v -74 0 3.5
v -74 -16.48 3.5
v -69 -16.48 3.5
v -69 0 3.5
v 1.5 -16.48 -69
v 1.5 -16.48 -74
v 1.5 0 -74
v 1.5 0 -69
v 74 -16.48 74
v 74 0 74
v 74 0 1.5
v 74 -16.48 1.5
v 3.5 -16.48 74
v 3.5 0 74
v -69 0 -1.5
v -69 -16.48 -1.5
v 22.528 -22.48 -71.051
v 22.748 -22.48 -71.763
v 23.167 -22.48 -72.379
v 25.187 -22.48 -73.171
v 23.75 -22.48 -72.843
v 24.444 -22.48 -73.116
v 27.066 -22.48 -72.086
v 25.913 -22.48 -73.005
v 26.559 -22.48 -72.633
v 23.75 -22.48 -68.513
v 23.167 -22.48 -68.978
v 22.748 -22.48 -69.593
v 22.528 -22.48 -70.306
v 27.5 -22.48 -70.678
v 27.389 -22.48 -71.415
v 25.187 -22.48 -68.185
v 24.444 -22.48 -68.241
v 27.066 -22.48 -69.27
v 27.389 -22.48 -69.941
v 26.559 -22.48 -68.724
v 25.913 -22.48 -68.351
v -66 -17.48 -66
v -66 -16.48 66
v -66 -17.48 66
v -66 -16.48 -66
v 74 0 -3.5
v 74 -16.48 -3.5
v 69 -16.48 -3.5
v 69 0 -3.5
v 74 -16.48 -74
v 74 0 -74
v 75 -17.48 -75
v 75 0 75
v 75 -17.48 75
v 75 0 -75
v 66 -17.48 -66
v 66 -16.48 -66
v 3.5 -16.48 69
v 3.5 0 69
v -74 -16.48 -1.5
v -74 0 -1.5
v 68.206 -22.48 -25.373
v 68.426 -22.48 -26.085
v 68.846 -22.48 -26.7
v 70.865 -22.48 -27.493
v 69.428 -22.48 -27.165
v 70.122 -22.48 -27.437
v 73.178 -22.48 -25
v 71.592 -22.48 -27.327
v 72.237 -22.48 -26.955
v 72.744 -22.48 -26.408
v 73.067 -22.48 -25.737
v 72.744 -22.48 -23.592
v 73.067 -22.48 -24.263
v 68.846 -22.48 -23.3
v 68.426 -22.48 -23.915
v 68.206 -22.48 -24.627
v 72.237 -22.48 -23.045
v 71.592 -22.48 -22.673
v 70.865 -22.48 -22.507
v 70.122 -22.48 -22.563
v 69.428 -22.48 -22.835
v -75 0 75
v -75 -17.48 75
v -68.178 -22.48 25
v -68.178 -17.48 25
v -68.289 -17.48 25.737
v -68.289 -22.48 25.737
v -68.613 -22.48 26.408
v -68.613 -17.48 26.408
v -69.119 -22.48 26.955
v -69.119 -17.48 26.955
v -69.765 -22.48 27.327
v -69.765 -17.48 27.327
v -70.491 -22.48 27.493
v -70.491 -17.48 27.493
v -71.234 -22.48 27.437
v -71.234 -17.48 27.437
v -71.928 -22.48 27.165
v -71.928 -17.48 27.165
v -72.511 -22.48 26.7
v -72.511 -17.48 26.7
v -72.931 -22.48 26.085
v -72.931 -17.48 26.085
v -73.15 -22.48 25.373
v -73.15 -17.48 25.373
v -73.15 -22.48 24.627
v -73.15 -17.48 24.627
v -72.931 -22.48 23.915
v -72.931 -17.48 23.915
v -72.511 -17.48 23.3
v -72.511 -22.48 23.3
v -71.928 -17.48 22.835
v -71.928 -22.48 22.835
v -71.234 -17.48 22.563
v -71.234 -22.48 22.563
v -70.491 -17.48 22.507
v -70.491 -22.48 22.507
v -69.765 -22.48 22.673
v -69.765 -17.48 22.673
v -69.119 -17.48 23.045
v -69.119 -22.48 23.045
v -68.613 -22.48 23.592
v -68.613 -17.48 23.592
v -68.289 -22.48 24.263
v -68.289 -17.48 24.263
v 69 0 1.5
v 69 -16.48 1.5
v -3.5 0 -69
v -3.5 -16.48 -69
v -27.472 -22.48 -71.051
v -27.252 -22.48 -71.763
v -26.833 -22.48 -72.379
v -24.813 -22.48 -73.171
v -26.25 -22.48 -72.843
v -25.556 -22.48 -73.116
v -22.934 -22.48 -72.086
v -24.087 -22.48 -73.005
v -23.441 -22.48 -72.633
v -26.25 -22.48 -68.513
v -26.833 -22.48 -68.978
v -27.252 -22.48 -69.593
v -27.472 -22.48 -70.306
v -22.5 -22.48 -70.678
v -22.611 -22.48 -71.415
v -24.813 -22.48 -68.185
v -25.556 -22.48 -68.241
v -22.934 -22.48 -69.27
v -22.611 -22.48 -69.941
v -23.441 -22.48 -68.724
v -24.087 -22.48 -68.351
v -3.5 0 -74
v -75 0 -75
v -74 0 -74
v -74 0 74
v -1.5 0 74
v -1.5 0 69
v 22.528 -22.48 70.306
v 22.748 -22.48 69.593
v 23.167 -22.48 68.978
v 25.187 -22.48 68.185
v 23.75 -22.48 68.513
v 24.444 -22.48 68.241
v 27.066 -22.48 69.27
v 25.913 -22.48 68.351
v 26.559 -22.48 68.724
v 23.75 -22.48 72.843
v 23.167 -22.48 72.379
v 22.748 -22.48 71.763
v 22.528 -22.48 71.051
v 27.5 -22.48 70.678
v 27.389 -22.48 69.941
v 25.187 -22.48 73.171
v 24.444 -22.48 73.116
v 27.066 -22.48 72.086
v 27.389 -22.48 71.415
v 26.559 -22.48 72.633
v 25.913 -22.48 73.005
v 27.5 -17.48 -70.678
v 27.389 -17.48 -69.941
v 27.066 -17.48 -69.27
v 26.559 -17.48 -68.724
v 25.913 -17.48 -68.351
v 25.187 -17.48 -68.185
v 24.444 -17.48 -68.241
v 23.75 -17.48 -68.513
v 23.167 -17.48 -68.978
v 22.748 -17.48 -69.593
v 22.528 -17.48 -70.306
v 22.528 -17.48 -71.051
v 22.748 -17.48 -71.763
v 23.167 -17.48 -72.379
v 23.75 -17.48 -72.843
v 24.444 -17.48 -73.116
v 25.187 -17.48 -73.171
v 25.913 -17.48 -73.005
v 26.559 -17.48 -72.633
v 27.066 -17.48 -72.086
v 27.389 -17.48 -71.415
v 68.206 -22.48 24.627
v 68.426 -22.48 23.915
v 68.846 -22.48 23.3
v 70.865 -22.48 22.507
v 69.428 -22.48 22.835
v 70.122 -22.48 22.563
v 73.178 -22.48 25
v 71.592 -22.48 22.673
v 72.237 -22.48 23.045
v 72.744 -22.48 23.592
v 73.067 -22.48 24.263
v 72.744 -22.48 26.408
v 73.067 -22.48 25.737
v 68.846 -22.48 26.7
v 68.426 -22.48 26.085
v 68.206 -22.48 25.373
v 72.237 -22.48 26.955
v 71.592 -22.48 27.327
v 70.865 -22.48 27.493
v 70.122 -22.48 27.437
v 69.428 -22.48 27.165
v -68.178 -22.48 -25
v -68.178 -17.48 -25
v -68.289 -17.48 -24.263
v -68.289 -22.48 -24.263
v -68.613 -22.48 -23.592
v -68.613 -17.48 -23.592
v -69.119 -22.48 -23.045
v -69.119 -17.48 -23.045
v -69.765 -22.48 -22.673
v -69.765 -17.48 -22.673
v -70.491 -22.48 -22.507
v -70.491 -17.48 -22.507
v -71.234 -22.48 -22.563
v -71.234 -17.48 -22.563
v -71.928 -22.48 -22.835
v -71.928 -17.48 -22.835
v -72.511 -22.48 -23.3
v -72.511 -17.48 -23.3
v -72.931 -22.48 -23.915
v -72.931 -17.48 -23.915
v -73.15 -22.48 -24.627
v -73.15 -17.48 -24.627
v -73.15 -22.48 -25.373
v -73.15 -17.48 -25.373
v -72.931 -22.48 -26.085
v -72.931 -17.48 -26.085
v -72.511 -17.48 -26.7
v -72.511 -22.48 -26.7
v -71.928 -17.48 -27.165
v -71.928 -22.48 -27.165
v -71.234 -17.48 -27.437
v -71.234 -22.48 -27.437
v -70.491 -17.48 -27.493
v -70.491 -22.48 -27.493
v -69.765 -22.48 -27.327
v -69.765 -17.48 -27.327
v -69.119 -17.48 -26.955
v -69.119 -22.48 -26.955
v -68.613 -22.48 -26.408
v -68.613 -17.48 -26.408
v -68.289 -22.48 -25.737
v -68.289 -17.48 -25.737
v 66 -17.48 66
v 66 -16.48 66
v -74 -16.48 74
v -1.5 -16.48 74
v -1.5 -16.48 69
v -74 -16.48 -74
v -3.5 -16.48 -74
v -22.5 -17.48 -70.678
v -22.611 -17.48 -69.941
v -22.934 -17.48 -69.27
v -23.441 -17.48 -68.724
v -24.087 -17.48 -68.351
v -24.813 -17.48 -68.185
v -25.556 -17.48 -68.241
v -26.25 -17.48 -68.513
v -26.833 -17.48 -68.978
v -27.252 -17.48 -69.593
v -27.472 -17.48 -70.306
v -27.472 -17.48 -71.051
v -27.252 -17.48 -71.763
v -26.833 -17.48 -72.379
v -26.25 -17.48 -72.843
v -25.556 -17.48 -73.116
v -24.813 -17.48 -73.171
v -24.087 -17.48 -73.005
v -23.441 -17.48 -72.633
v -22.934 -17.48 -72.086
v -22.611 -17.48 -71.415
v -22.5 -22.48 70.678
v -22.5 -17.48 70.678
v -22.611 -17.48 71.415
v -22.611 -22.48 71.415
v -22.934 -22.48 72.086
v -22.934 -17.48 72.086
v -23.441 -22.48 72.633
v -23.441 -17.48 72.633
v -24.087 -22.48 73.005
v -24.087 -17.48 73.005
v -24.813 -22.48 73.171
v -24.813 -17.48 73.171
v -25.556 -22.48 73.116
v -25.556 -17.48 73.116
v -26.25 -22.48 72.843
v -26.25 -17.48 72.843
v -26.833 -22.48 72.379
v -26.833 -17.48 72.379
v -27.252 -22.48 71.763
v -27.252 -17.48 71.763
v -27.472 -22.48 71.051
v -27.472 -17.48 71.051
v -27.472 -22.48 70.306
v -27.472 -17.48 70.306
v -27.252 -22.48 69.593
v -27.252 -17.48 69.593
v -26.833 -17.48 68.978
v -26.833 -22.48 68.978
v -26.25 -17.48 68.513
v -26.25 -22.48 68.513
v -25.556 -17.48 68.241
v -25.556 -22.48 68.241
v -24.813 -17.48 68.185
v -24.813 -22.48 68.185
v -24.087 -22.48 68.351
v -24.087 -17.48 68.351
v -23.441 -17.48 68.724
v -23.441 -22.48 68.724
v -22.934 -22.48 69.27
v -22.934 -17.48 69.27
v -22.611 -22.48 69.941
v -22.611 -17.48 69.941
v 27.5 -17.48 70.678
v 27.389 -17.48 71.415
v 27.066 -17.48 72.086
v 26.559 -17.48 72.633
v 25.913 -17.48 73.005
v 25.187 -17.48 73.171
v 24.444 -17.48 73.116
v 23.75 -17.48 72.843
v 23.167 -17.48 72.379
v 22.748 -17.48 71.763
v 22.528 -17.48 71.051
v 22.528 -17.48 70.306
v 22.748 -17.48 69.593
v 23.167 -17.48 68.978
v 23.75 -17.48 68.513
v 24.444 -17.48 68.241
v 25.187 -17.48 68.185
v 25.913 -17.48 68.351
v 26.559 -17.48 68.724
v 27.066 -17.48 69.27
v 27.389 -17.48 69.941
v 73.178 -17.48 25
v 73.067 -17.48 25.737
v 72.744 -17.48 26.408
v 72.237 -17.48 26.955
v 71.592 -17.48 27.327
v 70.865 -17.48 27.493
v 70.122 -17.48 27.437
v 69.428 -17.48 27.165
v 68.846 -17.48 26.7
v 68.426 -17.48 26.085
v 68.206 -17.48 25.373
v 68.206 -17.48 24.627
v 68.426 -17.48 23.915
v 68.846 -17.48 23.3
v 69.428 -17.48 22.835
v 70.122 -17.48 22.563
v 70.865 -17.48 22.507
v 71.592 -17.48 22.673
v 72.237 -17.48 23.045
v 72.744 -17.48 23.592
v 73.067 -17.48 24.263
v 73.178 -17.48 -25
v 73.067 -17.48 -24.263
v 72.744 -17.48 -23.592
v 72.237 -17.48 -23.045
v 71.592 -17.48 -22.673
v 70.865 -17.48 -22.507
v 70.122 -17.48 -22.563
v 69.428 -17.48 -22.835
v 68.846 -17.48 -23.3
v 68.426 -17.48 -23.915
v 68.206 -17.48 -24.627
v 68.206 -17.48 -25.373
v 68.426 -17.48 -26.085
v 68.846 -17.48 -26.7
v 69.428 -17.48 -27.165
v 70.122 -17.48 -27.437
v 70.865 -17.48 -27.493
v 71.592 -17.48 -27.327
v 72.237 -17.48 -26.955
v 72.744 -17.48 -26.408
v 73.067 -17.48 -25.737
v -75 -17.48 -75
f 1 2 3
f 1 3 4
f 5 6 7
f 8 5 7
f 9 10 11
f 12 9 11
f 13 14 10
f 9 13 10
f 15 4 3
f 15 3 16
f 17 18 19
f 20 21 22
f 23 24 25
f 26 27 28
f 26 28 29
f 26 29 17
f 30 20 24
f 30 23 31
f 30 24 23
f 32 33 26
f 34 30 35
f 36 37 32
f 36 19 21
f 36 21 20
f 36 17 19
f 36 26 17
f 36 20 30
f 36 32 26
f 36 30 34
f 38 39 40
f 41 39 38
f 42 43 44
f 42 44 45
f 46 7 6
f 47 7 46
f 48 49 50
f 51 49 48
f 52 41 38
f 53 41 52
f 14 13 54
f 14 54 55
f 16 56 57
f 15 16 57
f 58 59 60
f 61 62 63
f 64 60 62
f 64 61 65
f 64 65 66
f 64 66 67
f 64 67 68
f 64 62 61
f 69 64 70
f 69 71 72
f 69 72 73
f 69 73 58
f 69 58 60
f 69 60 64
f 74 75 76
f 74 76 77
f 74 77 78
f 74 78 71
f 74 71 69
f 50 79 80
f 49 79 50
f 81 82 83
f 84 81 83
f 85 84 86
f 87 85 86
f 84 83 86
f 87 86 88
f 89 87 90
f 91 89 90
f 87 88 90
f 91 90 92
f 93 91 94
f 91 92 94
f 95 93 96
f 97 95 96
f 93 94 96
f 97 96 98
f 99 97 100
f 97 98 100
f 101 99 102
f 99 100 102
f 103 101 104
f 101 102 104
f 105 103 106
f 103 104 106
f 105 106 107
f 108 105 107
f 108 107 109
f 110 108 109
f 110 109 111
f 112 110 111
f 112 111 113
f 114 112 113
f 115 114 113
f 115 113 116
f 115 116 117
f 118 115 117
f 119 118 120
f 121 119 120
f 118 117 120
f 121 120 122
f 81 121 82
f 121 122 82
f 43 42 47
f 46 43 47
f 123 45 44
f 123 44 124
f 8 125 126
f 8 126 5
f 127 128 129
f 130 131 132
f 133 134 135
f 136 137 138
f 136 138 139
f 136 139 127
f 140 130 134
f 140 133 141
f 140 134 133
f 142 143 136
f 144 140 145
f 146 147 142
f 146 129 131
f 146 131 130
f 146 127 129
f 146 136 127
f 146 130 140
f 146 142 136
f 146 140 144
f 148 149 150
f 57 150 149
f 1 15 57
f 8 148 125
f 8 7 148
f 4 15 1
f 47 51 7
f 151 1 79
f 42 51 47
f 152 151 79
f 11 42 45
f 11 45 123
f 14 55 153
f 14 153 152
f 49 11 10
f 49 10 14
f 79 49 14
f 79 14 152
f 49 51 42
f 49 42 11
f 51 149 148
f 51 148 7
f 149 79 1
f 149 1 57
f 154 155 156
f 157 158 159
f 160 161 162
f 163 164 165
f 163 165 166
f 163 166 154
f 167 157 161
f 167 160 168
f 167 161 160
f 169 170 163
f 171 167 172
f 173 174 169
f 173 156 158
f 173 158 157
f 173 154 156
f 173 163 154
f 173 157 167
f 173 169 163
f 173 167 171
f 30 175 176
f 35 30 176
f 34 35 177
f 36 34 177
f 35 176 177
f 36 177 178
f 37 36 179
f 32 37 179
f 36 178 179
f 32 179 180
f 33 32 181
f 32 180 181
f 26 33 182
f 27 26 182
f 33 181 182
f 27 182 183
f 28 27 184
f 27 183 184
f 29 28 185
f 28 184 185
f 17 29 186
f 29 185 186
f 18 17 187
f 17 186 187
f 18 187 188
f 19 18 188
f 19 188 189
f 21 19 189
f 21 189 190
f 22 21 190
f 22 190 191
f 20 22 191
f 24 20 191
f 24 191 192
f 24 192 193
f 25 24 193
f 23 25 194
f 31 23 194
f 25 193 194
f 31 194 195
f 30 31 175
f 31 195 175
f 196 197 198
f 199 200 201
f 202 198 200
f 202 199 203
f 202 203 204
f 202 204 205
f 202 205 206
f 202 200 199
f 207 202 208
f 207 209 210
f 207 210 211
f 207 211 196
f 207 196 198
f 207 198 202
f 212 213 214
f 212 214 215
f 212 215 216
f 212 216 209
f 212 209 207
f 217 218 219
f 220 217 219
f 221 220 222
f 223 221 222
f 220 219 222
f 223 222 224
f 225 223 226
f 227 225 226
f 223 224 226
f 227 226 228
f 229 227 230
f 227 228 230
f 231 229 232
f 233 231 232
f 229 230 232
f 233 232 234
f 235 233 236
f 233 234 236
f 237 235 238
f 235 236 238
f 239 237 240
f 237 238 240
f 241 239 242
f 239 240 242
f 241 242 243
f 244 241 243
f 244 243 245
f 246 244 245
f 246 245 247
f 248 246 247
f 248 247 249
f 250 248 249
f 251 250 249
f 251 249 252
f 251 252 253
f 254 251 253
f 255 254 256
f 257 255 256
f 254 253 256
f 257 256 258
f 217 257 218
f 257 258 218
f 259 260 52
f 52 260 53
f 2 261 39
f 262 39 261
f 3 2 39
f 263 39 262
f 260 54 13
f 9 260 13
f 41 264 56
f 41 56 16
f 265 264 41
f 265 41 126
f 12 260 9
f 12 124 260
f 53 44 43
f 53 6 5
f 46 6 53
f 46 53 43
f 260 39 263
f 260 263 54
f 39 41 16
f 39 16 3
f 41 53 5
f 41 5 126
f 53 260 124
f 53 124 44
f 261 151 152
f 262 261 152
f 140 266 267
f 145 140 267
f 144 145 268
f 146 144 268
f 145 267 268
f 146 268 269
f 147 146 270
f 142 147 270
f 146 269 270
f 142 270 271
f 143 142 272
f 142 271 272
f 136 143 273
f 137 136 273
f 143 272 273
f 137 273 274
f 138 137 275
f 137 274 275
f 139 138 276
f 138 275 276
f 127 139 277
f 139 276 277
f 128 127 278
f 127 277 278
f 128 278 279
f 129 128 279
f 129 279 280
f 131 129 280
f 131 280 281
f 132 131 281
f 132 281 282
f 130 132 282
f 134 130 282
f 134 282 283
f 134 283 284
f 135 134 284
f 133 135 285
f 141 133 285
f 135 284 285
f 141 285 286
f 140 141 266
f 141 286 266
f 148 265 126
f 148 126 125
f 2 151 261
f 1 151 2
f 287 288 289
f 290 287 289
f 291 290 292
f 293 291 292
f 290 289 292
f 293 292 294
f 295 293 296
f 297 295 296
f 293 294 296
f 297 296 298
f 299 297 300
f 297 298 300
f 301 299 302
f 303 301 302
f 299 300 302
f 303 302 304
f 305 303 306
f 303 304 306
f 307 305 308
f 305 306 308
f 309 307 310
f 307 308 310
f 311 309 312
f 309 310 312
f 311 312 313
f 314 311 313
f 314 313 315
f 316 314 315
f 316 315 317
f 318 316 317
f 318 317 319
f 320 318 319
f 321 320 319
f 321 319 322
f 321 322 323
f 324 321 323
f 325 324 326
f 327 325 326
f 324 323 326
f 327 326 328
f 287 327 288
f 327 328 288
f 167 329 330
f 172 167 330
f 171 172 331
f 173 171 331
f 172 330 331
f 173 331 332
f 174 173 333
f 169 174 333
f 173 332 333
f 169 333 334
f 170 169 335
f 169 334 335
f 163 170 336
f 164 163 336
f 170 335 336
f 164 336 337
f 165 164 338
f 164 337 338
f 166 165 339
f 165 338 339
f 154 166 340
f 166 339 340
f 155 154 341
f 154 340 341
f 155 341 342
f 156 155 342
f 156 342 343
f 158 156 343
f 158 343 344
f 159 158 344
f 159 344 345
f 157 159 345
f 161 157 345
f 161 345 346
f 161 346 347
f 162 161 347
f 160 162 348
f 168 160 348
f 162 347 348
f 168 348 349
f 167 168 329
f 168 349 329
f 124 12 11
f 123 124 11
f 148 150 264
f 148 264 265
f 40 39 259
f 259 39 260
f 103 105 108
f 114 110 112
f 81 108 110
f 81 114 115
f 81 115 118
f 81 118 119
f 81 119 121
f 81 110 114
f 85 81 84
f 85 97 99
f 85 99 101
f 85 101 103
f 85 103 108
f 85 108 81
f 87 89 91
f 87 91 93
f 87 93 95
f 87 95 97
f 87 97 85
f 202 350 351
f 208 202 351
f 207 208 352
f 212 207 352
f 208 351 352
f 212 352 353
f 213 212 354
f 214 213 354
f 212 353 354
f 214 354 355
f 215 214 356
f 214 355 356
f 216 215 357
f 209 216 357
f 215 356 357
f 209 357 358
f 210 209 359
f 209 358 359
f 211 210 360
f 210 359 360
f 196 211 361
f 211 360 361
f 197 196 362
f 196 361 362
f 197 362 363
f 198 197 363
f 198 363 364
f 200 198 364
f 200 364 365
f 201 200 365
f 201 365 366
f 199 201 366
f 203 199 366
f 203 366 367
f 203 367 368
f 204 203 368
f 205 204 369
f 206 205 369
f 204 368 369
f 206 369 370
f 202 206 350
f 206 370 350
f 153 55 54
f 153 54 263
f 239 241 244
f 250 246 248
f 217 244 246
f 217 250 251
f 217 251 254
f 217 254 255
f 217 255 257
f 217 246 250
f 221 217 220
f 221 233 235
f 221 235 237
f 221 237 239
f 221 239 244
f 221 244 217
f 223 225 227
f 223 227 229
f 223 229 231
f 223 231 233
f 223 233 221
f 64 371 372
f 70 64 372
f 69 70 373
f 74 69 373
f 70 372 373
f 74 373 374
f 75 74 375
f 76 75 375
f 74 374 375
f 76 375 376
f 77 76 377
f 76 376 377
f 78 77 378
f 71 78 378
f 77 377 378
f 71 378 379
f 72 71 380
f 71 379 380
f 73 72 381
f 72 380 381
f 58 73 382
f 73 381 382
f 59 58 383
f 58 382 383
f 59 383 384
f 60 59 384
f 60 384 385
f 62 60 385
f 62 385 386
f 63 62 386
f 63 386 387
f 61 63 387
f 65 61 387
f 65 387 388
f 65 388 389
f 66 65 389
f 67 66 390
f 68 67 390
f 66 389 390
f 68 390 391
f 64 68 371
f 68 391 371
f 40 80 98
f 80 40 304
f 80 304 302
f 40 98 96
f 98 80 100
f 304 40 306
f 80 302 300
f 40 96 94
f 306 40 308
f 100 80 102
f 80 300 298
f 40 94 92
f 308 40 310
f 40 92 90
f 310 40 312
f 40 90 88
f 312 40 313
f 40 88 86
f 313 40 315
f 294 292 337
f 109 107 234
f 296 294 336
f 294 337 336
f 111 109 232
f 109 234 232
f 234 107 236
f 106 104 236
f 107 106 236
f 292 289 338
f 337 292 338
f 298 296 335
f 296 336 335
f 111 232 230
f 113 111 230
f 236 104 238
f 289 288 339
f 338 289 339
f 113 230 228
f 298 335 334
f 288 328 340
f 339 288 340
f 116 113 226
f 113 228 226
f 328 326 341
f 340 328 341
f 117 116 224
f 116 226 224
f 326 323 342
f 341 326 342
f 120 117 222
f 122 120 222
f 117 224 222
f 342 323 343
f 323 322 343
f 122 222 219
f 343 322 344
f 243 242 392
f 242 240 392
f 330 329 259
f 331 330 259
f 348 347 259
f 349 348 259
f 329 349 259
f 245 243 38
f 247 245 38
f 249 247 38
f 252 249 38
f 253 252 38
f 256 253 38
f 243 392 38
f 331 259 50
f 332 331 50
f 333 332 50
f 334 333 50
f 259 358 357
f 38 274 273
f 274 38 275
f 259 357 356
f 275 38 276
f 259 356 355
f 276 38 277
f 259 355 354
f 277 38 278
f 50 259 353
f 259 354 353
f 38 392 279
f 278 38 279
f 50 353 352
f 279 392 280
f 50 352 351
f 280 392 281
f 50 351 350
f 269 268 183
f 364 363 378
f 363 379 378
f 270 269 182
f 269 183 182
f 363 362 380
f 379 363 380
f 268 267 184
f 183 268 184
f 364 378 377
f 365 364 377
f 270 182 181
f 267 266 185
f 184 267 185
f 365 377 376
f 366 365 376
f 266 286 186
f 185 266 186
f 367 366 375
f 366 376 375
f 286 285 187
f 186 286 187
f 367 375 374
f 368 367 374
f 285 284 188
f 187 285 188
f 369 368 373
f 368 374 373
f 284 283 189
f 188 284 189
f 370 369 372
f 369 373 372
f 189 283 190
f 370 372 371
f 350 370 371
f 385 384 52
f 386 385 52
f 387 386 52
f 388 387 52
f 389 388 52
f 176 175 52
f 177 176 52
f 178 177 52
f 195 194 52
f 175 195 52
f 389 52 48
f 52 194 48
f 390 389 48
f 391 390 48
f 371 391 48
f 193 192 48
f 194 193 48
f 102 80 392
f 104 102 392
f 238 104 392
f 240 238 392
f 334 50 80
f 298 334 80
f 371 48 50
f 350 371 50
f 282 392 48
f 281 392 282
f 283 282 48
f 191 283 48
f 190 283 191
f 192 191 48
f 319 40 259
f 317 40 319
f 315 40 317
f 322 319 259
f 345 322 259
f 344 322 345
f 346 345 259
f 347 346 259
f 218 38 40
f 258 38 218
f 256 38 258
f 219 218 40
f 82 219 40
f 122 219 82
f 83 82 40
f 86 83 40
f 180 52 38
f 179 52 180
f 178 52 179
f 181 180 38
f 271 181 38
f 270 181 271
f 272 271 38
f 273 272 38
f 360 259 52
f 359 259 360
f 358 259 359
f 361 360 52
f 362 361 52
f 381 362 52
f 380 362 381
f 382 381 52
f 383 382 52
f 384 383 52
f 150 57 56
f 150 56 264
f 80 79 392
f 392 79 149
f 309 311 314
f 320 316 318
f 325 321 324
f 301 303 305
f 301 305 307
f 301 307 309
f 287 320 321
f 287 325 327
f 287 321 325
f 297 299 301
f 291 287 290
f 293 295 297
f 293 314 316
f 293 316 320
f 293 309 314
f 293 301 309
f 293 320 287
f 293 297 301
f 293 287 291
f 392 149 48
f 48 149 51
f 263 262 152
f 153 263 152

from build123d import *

# Parameters (mm, degrees)
SKETCH1_W           = 150
SKETCH1_H           = 150
BOSS_EXTRUDE1_DEPTH = 17.48
SKETCH2_W           = 148
SKETCH2_H           = 148
CUT_EXTRUDE1_DEPTH  = 16.48
SKETCH3_W           = 132
SKETCH3_H           = 132
CUT_EXTRUDE2_DEPTH  = 2
SKETCH4_W           = 5
SKETCH4_H           = 17.47
BOSS_EXTRUDE3_DEPTH = 5
CIRPATTERN2_COUNT   = 4
SKETCH6_R           = 2.5
BOSS_EXTRUDE5_DEPTH = 5


with BuildPart() as part:
    # Sketch1 → Boss-Extrude1 (new body)
    with BuildSketch(Plane(origin=(0, 0, 0), x_dir=(1, 0, 0), z_dir=(0, 1, 0))):
        Rectangle(SKETCH1_W, SKETCH1_H)
    extrude(amount=-BOSS_EXTRUDE1_DEPTH)

    # Sketch2 → Cut-Extrude1 (cut)
    with BuildSketch(Plane(origin=(0, 0, 0), x_dir=(1, 0, 0), z_dir=(0, 1, 0))):
        Rectangle(SKETCH2_W, SKETCH2_H)
    extrude(amount=-CUT_EXTRUDE1_DEPTH, mode=Mode.SUBTRACT)

    # Sketch3 → Cut-Extrude2 (cut, through all)
    with BuildSketch(Plane(origin=(0, -16.48, 0), x_dir=(1, 0, 0), z_dir=(0, 1, 0))):
        Rectangle(SKETCH3_W, SKETCH3_H)
    extrude(amount=-CUT_EXTRUDE2_DEPTH, mode=Mode.SUBTRACT)

    # Sketch4 → Boss-Extrude3 (add)
    with BuildSketch(Plane.XY.offset(-74)):
        with Locations((-1, -8.735)):
            Rectangle(SKETCH4_W, SKETCH4_H)
    boss_extrude3 = extrude(amount=BOSS_EXTRUDE3_DEPTH)

    # CirPattern2: Boss-Extrude3 ×4 about axis
    cirpattern2_axis = Axis((0, 0, 0), (0, 1, 0))
    for i in range(1, CIRPATTERN2_COUNT):
        add(boss_extrude3.rotate(cirpattern2_axis, i * 360 / CIRPATTERN2_COUNT))

    # Sketch6 → Boss-Extrude5 (add)
    with BuildSketch(Plane.XZ.offset(17.48)):
        with Locations((-70.678187872, -25)):
            Circle(SKETCH6_R)
        with Locations((-70.678187872, 25)):
            Circle(SKETCH6_R)
        with Locations((25, 70.678187872)):
            Circle(SKETCH6_R)
        with Locations((-25, 70.678187872)):
            Circle(SKETCH6_R)
        with Locations((70.678187872, -25)):
            Circle(SKETCH6_R)
        with Locations((70.678187872, 25)):
            Circle(SKETCH6_R)
        with Locations((-25, -70.678187872)):
            Circle(SKETCH6_R)
        with Locations((25, -70.678187872)):
            Circle(SKETCH6_R)
    extrude(amount=BOSS_EXTRUDE5_DEPTH)


solid = part.part
